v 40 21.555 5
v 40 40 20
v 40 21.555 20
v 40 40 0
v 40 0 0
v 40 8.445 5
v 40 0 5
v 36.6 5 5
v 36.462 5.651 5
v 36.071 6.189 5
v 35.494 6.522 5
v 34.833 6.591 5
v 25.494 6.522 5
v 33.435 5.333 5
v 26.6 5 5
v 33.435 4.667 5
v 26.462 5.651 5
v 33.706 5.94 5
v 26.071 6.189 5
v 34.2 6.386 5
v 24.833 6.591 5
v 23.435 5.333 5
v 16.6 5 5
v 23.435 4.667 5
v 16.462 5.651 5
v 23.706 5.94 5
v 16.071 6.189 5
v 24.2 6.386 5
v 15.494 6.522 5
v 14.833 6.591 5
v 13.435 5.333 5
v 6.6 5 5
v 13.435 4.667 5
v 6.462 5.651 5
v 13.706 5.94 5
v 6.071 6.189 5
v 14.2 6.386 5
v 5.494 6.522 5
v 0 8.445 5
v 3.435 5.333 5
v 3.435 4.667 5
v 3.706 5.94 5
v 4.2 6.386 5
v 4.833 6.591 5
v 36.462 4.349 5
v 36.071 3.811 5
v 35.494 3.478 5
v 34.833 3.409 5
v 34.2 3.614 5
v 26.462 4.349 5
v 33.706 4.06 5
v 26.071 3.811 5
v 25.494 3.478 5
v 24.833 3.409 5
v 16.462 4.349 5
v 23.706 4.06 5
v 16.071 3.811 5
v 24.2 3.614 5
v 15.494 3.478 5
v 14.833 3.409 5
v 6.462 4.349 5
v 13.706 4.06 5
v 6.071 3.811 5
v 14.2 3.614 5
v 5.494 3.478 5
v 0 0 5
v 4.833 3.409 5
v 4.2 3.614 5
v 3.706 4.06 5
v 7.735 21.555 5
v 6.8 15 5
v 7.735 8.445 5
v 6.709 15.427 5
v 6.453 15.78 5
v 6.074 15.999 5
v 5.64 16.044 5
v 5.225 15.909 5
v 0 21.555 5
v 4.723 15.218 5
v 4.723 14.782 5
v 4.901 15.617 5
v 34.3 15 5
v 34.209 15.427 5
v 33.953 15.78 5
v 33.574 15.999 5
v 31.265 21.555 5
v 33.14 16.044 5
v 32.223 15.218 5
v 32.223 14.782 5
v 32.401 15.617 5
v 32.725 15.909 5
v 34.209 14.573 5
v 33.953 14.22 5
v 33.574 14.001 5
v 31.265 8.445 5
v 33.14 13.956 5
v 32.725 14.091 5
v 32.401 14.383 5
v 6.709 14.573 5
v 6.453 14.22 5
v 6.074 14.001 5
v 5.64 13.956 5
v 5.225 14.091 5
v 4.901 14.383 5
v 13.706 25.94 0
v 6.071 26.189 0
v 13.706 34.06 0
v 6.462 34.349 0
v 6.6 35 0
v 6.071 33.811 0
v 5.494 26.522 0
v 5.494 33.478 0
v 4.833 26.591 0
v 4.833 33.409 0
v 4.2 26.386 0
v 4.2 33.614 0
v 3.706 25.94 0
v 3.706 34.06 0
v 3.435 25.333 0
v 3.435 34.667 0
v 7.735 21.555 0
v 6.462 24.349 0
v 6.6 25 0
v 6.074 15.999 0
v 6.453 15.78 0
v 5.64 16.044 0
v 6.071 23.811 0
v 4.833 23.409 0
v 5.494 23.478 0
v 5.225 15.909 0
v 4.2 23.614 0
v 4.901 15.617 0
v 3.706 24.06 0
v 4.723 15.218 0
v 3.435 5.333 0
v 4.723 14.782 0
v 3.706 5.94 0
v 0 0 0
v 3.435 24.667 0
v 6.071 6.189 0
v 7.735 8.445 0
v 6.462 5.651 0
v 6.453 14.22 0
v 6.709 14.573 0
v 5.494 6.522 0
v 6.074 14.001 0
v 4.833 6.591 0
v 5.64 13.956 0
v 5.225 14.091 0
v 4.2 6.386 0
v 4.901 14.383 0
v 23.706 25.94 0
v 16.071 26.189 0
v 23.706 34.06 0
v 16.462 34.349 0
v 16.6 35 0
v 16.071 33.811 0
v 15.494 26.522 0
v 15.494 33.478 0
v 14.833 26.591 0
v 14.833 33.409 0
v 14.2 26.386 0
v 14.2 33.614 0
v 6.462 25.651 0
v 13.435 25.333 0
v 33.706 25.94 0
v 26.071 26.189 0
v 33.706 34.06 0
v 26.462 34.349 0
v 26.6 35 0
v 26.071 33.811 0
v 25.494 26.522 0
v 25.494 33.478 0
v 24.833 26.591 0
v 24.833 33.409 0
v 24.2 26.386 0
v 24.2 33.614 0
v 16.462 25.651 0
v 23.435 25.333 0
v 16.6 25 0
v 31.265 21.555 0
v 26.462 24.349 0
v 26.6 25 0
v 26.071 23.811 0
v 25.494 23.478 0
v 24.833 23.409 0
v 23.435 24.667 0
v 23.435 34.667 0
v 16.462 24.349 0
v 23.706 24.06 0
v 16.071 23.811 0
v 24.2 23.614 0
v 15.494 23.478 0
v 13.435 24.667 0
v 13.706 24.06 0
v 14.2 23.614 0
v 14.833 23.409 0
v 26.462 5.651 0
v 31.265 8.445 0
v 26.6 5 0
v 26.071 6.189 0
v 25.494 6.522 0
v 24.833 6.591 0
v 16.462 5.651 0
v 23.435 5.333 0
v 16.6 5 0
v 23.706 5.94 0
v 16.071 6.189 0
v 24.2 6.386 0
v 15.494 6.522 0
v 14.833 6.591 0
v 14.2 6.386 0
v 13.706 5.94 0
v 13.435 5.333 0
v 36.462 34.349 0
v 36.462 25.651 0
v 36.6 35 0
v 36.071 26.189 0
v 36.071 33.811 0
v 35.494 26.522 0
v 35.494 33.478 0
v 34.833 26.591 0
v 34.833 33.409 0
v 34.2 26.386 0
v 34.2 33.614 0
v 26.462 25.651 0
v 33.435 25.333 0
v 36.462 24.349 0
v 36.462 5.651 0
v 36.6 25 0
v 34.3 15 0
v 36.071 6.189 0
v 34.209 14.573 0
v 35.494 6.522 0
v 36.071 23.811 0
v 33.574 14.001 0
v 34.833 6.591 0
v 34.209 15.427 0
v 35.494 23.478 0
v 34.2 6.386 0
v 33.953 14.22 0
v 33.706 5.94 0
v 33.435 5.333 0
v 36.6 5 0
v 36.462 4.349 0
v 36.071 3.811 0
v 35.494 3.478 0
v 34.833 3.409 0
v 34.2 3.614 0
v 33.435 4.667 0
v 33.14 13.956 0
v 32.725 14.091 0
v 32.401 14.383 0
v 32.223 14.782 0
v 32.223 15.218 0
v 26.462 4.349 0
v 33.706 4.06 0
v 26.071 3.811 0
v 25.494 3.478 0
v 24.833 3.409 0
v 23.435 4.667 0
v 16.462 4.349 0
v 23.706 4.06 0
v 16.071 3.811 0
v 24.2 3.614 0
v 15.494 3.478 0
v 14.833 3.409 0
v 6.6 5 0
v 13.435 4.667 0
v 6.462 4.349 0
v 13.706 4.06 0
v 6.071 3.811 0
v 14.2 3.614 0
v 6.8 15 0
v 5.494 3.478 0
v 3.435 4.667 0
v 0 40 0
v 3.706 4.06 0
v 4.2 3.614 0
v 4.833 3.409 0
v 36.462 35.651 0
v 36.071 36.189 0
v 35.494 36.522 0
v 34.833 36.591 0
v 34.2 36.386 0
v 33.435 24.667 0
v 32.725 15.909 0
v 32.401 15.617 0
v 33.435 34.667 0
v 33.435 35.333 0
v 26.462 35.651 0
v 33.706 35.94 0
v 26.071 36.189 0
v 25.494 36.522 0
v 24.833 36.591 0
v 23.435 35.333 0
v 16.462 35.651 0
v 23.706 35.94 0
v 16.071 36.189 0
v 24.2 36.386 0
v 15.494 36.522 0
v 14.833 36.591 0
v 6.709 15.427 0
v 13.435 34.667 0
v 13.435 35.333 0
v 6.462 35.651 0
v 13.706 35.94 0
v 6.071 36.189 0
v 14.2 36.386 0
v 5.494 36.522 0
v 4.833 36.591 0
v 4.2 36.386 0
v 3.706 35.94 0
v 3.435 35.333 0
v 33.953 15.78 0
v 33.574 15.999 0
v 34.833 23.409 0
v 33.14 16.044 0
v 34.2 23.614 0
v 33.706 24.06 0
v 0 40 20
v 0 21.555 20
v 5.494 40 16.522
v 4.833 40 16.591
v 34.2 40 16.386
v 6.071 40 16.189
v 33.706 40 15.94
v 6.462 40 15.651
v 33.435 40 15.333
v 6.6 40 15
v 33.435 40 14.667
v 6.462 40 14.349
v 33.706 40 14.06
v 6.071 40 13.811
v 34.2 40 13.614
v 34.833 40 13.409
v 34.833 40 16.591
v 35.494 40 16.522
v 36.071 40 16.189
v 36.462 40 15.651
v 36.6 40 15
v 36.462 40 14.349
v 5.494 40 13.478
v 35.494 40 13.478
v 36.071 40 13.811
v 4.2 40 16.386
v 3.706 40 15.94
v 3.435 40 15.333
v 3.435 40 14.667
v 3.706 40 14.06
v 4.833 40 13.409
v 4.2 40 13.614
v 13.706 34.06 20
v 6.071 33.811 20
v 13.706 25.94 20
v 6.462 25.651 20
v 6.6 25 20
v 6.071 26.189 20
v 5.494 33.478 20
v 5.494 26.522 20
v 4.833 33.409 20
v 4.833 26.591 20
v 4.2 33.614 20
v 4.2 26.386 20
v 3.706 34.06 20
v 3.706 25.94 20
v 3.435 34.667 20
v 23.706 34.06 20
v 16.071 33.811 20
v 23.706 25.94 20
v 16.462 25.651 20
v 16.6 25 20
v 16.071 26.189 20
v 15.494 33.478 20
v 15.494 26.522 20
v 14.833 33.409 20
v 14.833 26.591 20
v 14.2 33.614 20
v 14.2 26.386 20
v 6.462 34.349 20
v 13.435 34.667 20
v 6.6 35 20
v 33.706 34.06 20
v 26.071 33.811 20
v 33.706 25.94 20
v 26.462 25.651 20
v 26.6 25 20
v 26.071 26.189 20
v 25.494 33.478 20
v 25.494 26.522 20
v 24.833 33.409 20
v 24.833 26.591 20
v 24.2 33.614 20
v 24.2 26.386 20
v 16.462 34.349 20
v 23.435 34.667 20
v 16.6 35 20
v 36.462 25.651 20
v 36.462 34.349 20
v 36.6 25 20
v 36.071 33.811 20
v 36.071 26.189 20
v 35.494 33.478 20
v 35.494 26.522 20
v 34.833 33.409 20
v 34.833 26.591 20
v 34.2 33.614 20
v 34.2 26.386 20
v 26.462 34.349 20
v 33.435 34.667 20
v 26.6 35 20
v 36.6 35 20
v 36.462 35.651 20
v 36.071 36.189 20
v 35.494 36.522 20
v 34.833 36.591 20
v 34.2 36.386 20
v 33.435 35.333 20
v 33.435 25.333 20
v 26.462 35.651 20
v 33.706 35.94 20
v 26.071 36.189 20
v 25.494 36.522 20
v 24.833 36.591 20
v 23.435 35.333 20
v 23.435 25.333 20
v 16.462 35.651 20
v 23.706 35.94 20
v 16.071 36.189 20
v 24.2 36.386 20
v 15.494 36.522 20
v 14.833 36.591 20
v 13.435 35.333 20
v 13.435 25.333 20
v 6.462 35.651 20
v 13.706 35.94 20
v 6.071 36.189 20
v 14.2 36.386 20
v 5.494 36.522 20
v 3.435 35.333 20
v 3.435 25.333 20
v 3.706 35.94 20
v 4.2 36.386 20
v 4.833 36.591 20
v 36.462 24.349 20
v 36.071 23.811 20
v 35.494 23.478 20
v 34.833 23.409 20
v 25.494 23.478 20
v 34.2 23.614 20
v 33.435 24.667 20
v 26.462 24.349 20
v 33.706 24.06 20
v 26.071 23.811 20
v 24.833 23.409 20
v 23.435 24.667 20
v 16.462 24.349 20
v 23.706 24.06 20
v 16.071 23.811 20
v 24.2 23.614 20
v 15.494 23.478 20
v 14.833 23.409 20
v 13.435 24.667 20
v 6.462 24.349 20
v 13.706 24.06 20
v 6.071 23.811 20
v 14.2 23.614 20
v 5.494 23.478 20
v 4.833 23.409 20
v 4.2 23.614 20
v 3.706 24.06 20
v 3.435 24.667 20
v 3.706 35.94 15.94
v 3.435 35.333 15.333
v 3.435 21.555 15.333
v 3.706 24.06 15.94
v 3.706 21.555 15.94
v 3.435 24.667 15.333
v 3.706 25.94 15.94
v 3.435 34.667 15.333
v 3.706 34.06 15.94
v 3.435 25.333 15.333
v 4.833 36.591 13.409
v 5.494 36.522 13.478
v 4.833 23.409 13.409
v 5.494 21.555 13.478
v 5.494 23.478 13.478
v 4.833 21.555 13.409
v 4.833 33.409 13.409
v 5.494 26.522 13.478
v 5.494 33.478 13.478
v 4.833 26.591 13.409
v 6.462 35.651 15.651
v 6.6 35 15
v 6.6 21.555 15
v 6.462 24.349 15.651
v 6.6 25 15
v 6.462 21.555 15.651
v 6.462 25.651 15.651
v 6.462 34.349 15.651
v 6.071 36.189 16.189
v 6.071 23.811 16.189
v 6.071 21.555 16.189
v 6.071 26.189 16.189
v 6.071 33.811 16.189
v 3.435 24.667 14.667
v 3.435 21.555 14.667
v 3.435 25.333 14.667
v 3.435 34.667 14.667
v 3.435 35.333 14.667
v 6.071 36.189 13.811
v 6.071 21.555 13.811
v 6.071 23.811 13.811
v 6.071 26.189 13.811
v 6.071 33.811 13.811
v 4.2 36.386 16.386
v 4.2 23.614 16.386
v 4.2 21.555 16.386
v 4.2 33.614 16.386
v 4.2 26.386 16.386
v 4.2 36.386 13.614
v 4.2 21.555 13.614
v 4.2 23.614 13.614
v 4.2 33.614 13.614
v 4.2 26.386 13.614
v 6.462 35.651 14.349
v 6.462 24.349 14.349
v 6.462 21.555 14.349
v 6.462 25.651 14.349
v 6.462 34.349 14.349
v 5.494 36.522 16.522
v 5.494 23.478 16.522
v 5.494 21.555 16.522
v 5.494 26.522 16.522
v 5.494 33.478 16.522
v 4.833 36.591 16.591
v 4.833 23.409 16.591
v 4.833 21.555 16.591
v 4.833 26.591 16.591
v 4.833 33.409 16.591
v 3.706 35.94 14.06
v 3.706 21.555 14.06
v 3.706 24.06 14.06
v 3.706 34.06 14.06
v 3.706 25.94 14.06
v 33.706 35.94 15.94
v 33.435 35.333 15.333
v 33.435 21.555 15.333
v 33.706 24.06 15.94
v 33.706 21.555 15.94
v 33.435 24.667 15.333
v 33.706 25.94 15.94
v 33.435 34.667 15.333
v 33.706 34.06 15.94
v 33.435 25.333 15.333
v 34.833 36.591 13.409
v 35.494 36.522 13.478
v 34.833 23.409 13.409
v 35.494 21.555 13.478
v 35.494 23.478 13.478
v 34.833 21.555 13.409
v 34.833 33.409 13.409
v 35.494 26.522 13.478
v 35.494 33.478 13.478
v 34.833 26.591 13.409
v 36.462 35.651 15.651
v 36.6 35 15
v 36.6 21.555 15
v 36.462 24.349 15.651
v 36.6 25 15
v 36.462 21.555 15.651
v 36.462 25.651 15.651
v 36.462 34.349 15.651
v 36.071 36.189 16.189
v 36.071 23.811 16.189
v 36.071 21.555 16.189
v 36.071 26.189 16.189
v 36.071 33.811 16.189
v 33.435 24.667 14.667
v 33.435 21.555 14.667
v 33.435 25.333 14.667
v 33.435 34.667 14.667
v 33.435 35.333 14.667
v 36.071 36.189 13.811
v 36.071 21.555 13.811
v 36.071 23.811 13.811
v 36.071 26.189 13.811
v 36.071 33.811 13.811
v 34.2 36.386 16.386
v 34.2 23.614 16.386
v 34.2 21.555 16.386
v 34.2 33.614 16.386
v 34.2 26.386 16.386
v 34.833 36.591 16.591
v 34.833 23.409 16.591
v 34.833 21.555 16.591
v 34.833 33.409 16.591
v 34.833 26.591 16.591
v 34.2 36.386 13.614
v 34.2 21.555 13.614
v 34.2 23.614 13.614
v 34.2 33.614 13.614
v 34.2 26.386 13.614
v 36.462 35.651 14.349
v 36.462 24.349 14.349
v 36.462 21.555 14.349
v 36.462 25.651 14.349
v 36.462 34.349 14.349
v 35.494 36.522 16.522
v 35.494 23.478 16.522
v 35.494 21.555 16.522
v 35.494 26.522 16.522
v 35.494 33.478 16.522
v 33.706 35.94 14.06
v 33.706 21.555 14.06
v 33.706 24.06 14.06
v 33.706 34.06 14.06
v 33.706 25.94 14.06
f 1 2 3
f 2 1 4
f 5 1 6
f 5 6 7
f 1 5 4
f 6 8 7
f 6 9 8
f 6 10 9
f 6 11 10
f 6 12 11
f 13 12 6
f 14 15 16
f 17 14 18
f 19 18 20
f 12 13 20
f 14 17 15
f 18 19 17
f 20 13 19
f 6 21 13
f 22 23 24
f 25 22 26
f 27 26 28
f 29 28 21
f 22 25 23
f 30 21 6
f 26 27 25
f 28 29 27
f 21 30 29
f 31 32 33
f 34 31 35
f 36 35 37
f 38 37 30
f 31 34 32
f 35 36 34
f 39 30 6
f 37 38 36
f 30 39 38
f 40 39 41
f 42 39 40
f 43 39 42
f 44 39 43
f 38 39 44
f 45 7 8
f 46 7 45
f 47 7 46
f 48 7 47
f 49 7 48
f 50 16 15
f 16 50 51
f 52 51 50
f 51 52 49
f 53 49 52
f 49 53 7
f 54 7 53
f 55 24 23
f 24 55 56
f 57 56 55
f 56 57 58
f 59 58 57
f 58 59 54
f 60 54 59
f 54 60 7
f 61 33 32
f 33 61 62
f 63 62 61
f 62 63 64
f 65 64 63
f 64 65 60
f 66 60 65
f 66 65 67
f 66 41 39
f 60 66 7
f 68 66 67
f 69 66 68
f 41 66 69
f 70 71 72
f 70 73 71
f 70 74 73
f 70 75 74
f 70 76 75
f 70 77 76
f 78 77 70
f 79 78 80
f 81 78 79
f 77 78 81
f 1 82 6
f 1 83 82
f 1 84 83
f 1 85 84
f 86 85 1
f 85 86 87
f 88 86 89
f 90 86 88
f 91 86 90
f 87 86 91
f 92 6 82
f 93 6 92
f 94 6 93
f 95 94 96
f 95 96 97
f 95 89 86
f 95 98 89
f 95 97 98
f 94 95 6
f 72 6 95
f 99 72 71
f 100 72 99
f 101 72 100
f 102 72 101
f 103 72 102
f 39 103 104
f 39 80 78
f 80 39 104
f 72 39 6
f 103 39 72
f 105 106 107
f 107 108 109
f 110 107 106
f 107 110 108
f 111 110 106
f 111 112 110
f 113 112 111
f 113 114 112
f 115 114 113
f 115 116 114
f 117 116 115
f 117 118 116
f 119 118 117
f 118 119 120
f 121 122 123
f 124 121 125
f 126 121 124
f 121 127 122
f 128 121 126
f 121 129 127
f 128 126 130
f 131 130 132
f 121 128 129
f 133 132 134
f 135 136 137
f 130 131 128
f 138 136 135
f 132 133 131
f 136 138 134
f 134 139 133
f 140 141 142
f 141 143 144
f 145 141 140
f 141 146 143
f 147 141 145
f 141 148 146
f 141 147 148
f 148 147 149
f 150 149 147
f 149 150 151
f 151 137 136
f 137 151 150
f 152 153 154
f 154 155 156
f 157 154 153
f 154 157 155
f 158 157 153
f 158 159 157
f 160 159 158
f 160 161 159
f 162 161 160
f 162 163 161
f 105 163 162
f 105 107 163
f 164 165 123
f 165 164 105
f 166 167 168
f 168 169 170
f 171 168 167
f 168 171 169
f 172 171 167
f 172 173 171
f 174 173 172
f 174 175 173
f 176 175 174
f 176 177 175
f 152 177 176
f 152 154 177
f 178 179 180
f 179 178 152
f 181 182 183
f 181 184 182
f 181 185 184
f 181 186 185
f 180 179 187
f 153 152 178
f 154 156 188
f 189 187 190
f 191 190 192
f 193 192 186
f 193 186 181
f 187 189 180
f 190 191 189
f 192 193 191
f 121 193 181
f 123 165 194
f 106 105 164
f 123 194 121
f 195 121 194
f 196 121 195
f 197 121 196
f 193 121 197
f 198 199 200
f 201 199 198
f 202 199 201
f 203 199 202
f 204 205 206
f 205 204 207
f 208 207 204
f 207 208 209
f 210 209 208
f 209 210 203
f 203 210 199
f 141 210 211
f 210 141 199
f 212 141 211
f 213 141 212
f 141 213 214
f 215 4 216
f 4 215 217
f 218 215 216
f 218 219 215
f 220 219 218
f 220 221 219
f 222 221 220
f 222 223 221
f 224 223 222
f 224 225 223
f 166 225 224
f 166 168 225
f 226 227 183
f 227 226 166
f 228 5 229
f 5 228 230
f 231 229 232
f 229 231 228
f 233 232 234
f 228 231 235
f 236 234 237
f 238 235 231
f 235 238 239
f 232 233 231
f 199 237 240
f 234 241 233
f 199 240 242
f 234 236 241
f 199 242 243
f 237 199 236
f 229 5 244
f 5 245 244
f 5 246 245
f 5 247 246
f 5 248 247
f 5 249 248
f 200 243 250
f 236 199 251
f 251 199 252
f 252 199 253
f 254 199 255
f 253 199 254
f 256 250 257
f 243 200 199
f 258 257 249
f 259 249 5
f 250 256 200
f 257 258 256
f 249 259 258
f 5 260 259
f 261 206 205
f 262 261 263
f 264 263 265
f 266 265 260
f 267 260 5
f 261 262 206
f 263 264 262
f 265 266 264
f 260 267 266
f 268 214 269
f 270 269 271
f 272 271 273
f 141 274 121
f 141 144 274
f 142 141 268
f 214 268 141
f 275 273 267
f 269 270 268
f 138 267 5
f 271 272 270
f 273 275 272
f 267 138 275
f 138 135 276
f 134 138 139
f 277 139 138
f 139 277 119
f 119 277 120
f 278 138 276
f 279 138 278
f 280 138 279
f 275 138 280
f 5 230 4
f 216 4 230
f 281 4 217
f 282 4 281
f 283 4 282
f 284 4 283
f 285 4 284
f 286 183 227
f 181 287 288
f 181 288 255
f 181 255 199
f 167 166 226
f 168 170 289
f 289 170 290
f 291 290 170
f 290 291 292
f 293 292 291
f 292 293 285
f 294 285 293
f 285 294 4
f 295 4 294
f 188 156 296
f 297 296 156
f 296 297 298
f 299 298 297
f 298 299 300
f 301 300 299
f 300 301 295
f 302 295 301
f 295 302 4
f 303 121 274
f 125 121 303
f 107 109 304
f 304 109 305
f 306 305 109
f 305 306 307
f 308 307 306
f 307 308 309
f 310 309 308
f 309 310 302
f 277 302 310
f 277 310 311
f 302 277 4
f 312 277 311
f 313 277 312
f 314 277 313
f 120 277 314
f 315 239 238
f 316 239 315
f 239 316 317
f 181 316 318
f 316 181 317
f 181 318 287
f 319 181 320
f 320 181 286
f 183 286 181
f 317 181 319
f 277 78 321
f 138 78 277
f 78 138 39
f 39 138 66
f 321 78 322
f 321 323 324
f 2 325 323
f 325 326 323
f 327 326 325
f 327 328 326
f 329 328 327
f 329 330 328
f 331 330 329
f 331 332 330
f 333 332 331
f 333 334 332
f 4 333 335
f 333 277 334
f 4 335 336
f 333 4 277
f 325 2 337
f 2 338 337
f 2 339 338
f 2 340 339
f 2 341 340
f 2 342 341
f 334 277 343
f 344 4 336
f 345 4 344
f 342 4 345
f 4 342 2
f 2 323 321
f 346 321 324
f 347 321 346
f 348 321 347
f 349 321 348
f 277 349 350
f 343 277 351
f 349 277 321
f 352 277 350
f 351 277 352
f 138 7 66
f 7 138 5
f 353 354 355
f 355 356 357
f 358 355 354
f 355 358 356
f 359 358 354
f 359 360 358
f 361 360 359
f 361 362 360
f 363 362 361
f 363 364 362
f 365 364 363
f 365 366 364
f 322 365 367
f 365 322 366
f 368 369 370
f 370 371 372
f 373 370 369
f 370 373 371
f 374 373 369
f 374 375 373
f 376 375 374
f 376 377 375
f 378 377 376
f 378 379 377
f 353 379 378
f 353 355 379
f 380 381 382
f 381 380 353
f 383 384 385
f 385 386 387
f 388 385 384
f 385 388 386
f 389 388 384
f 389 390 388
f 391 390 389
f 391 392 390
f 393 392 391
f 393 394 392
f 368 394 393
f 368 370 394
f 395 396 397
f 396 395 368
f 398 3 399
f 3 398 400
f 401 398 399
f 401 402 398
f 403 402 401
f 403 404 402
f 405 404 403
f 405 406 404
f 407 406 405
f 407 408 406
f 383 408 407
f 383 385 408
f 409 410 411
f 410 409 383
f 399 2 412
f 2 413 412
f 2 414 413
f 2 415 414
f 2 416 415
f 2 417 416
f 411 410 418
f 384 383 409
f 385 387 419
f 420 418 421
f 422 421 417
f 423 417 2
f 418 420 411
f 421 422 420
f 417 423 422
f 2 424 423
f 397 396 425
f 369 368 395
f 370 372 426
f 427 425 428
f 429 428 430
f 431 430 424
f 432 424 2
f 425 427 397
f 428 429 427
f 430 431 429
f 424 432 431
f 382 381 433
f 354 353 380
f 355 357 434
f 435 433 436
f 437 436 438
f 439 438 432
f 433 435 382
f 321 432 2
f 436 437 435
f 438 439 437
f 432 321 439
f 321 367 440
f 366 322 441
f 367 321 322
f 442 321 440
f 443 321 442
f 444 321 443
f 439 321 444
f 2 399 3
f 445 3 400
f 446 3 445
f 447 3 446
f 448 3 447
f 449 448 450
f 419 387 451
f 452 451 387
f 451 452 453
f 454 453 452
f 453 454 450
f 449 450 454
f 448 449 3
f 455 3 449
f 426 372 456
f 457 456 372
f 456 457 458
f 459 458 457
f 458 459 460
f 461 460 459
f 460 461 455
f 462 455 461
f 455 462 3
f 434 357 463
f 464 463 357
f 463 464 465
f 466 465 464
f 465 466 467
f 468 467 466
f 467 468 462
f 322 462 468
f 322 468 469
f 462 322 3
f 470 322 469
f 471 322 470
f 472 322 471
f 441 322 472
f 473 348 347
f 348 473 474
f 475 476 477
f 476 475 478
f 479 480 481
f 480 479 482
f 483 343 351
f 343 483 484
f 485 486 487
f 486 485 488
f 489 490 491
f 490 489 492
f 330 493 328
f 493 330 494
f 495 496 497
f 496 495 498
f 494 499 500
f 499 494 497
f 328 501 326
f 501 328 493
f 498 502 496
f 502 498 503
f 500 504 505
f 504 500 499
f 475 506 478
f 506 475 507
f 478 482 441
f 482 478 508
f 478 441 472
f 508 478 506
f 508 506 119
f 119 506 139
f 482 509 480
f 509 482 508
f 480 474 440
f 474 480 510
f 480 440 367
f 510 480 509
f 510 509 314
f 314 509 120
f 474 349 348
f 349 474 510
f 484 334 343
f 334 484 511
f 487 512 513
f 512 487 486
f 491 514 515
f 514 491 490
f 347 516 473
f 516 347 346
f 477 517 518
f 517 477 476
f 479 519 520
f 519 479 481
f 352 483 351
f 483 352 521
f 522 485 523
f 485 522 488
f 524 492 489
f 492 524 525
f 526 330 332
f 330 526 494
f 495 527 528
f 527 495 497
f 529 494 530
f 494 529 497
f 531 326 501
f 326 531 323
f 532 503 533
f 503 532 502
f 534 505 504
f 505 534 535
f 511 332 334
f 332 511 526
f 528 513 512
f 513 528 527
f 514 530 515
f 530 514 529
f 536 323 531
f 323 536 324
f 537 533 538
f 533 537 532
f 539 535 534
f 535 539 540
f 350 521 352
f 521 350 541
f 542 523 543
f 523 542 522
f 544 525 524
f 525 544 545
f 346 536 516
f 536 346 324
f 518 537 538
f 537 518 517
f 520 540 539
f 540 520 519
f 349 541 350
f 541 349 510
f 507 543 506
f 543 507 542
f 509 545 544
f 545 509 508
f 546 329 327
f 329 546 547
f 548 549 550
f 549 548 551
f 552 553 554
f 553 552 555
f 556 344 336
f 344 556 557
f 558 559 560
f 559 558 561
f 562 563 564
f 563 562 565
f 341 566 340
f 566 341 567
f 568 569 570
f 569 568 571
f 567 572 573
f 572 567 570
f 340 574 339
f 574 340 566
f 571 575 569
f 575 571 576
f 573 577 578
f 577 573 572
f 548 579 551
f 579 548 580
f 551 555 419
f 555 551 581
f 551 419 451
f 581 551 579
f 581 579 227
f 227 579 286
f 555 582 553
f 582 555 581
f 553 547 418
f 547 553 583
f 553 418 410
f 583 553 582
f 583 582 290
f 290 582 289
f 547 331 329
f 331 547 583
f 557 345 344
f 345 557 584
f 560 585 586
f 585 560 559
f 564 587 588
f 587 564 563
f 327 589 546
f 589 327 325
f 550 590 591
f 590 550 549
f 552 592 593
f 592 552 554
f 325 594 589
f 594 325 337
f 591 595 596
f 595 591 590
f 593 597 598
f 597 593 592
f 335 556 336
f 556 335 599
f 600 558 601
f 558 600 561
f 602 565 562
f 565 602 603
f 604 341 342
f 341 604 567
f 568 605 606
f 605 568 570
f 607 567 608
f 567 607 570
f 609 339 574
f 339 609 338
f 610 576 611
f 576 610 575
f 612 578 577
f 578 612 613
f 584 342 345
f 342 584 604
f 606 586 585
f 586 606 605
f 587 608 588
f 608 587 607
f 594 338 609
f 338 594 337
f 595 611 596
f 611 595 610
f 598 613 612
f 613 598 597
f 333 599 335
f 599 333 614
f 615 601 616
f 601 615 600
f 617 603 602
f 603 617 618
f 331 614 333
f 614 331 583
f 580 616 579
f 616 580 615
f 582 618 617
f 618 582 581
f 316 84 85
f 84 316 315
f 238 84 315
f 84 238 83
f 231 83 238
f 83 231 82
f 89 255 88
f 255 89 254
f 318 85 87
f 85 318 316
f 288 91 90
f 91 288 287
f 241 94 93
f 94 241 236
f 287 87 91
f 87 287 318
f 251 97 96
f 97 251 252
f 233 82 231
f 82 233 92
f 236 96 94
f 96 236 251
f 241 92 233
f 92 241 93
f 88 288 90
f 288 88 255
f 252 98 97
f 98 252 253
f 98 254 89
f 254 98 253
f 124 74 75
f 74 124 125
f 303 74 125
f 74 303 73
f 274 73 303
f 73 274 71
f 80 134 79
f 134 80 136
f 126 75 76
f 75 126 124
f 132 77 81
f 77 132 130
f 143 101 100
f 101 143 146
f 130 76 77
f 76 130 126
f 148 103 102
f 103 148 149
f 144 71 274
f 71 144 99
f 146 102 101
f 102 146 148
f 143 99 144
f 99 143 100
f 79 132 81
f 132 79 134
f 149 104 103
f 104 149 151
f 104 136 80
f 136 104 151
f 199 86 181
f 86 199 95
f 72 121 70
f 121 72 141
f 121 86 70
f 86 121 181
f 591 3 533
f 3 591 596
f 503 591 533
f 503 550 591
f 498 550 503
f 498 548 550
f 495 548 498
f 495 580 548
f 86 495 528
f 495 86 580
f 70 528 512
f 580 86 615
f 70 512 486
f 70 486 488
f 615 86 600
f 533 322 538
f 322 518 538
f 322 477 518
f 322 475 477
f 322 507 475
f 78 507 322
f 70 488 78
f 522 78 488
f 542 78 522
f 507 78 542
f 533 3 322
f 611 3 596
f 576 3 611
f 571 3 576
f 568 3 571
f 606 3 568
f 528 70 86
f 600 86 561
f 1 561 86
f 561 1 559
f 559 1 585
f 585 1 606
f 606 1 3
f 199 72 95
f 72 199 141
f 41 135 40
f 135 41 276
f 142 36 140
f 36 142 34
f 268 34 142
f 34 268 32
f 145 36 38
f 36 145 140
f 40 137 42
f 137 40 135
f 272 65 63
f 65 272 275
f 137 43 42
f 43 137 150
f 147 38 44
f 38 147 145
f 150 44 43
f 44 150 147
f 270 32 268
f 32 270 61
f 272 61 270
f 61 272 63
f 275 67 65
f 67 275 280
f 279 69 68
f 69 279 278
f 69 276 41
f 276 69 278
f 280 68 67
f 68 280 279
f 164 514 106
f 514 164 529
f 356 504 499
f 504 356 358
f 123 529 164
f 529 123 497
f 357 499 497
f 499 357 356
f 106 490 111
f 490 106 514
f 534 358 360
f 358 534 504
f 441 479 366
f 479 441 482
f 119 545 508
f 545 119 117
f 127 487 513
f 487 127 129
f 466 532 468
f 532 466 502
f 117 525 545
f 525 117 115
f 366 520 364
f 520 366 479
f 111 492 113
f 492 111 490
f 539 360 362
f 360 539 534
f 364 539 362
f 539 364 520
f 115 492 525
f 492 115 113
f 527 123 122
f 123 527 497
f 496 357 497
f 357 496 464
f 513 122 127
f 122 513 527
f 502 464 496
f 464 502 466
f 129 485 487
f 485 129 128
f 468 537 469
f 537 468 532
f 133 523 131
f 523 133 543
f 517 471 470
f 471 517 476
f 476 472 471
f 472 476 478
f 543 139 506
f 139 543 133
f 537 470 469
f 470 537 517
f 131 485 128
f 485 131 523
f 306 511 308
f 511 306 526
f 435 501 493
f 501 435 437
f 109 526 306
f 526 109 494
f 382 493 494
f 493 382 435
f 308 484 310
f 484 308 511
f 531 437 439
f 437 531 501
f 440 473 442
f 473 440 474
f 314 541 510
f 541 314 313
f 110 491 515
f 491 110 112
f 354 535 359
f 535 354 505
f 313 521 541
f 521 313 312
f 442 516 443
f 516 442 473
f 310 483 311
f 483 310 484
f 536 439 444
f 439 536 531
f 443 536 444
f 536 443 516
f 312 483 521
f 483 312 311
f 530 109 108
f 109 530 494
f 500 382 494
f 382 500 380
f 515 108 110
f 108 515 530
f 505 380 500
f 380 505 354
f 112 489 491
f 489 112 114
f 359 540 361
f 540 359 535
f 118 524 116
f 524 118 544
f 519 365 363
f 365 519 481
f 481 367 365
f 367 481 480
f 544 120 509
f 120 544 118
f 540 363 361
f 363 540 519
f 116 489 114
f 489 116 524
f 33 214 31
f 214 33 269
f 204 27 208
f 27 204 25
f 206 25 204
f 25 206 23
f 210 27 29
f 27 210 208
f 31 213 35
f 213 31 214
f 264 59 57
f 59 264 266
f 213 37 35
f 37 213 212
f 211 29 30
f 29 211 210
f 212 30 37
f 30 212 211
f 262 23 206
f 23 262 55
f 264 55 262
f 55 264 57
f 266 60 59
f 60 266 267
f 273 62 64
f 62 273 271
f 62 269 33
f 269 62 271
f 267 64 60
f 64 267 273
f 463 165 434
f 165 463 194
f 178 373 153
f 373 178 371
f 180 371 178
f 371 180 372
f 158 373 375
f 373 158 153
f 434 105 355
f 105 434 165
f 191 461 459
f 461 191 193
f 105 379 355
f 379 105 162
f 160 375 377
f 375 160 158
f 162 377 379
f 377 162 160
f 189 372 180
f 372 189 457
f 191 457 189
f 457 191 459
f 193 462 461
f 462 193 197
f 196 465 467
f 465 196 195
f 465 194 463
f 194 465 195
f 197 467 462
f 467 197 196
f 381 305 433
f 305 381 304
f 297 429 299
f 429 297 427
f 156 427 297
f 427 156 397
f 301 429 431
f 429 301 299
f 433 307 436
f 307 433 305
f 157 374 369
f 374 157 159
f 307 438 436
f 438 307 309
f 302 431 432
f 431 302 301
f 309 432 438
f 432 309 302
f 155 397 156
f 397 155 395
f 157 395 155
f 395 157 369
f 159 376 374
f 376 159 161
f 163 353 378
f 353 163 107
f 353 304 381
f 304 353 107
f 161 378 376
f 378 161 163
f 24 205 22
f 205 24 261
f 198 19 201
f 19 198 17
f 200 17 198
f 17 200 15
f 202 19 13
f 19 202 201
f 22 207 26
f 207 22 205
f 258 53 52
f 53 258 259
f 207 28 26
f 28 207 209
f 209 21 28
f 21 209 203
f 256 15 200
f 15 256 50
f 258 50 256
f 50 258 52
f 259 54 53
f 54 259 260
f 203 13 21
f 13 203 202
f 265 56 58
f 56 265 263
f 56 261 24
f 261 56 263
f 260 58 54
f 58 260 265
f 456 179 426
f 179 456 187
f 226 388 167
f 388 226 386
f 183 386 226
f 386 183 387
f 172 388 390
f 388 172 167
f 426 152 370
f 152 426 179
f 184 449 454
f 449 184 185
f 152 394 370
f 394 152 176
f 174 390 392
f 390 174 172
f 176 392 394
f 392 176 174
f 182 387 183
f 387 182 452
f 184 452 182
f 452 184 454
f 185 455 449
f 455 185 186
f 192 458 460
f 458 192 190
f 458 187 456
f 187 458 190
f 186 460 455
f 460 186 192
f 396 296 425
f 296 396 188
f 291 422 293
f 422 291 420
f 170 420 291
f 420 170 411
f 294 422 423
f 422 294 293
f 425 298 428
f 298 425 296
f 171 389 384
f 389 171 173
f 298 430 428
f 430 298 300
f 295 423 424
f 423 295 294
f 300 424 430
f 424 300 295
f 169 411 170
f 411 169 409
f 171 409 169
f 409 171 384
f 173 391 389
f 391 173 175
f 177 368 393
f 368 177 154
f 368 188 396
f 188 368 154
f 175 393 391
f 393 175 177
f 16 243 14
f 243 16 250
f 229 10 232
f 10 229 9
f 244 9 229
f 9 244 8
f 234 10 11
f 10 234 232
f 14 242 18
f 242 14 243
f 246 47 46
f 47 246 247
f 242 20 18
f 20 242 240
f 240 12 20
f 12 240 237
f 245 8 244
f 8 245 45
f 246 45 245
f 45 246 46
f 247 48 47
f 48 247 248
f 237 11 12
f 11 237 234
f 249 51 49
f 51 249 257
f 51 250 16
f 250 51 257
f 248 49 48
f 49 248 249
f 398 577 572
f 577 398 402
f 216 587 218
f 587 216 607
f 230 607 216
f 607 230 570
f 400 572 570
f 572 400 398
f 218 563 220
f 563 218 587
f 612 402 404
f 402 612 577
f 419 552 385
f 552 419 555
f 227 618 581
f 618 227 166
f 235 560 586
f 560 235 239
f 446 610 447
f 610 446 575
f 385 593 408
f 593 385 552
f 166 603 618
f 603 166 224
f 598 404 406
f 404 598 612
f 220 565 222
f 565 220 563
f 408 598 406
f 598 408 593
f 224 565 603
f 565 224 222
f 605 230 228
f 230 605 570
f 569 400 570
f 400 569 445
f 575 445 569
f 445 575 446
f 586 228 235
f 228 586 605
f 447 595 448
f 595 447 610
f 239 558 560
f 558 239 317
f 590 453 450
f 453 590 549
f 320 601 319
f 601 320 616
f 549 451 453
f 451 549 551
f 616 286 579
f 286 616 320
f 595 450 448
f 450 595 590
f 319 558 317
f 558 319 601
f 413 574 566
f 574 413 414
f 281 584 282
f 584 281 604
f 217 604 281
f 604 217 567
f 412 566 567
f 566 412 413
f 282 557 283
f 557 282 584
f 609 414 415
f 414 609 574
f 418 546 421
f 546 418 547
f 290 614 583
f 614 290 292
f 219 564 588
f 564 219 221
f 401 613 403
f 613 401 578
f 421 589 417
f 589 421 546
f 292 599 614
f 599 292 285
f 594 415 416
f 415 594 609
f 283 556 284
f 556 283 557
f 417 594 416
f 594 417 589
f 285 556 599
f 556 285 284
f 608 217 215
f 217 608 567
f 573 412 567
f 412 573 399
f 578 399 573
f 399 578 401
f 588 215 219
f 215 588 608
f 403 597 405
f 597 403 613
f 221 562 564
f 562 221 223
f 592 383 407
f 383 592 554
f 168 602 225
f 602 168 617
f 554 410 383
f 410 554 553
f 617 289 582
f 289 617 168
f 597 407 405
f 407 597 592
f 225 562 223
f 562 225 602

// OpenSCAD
$fn=15;

PLATE_THICKNESS = 5;

SCREW_SPACING = 27.5; //center-to-center dist. between servo mounting holes.

AXLE_POSITION = 8.25; //distance from servo output axis to center of nearest
                      //mounting hole. Aligned to part grid.
SHOW_AXLE_POSITION = false;
                      
SERVO_BOXWIDTH = 12.11;
SERVO_BOXLENGTH = 22.53;

cutout_width = SERVO_BOXWIDTH + 1;
cutout_length = SERVO_BOXLENGTH + 1;
MOUNTHOLE_D = 2.1;

GRIDHOLE_D = 3.2;

N = 4;
M = 4;

P = 3;
Q = 2;

AXLE_X_POS = (P*10)-5;
AXLE_Y_POS = (Q*10)-5;

if(SHOW_AXLE_POSITION == true){
    translate([AXLE_X_POS,AXLE_Y_POS,0]){
        color("red")
        cylinder(h=100,d=2,center=true);
}
}


difference(){
    
    union(){
        cube([N*10,M*10,PLATE_THICKNESS]);
        translate([0,20,0])cube([40,20,20]);
    }
    translate([-1,AXLE_Y_POS-cutout_width/2,PLATE_THICKNESS]){
        cube([100,cutout_width,100]);
    }
    for(i=[0:1]){
        translate([5+i*10*(N-1),0,15])
        rotate(90,[1,0,0])
        cylinder(h=200,d=GRIDHOLE_D,center=true);
    }
    translate([AXLE_X_POS,AXLE_Y_POS,0]){
        
        translate([AXLE_POSITION,0,0]){
            cylinder(d=MOUNTHOLE_D, h=100, center=true);
        }
        translate([AXLE_POSITION - SCREW_SPACING,0,0]){
            cylinder(d=MOUNTHOLE_D, h=100, center=true);
        }
        translate([AXLE_POSITION - (SCREW_SPACING/2),0,0]){
            cube([cutout_length,cutout_width,100], center=true);
        }
    }
    
    for(i = [0:N-1]){
        for(j = [0:M-1]){
            if(!(((i==((AXLE_X_POS-5)/10)-2)&&(j==(AXLE_Y_POS-5)/10))||((i==((AXLE_X_POS-5)/10)+1)&&(j==(AXLE_Y_POS-5)/10)))){
                translate([5+i*10,5+j*10,0]){
                    cylinder(d=GRIDHOLE_D,h=100,center=true);
                }
            }
        }
    }
}
